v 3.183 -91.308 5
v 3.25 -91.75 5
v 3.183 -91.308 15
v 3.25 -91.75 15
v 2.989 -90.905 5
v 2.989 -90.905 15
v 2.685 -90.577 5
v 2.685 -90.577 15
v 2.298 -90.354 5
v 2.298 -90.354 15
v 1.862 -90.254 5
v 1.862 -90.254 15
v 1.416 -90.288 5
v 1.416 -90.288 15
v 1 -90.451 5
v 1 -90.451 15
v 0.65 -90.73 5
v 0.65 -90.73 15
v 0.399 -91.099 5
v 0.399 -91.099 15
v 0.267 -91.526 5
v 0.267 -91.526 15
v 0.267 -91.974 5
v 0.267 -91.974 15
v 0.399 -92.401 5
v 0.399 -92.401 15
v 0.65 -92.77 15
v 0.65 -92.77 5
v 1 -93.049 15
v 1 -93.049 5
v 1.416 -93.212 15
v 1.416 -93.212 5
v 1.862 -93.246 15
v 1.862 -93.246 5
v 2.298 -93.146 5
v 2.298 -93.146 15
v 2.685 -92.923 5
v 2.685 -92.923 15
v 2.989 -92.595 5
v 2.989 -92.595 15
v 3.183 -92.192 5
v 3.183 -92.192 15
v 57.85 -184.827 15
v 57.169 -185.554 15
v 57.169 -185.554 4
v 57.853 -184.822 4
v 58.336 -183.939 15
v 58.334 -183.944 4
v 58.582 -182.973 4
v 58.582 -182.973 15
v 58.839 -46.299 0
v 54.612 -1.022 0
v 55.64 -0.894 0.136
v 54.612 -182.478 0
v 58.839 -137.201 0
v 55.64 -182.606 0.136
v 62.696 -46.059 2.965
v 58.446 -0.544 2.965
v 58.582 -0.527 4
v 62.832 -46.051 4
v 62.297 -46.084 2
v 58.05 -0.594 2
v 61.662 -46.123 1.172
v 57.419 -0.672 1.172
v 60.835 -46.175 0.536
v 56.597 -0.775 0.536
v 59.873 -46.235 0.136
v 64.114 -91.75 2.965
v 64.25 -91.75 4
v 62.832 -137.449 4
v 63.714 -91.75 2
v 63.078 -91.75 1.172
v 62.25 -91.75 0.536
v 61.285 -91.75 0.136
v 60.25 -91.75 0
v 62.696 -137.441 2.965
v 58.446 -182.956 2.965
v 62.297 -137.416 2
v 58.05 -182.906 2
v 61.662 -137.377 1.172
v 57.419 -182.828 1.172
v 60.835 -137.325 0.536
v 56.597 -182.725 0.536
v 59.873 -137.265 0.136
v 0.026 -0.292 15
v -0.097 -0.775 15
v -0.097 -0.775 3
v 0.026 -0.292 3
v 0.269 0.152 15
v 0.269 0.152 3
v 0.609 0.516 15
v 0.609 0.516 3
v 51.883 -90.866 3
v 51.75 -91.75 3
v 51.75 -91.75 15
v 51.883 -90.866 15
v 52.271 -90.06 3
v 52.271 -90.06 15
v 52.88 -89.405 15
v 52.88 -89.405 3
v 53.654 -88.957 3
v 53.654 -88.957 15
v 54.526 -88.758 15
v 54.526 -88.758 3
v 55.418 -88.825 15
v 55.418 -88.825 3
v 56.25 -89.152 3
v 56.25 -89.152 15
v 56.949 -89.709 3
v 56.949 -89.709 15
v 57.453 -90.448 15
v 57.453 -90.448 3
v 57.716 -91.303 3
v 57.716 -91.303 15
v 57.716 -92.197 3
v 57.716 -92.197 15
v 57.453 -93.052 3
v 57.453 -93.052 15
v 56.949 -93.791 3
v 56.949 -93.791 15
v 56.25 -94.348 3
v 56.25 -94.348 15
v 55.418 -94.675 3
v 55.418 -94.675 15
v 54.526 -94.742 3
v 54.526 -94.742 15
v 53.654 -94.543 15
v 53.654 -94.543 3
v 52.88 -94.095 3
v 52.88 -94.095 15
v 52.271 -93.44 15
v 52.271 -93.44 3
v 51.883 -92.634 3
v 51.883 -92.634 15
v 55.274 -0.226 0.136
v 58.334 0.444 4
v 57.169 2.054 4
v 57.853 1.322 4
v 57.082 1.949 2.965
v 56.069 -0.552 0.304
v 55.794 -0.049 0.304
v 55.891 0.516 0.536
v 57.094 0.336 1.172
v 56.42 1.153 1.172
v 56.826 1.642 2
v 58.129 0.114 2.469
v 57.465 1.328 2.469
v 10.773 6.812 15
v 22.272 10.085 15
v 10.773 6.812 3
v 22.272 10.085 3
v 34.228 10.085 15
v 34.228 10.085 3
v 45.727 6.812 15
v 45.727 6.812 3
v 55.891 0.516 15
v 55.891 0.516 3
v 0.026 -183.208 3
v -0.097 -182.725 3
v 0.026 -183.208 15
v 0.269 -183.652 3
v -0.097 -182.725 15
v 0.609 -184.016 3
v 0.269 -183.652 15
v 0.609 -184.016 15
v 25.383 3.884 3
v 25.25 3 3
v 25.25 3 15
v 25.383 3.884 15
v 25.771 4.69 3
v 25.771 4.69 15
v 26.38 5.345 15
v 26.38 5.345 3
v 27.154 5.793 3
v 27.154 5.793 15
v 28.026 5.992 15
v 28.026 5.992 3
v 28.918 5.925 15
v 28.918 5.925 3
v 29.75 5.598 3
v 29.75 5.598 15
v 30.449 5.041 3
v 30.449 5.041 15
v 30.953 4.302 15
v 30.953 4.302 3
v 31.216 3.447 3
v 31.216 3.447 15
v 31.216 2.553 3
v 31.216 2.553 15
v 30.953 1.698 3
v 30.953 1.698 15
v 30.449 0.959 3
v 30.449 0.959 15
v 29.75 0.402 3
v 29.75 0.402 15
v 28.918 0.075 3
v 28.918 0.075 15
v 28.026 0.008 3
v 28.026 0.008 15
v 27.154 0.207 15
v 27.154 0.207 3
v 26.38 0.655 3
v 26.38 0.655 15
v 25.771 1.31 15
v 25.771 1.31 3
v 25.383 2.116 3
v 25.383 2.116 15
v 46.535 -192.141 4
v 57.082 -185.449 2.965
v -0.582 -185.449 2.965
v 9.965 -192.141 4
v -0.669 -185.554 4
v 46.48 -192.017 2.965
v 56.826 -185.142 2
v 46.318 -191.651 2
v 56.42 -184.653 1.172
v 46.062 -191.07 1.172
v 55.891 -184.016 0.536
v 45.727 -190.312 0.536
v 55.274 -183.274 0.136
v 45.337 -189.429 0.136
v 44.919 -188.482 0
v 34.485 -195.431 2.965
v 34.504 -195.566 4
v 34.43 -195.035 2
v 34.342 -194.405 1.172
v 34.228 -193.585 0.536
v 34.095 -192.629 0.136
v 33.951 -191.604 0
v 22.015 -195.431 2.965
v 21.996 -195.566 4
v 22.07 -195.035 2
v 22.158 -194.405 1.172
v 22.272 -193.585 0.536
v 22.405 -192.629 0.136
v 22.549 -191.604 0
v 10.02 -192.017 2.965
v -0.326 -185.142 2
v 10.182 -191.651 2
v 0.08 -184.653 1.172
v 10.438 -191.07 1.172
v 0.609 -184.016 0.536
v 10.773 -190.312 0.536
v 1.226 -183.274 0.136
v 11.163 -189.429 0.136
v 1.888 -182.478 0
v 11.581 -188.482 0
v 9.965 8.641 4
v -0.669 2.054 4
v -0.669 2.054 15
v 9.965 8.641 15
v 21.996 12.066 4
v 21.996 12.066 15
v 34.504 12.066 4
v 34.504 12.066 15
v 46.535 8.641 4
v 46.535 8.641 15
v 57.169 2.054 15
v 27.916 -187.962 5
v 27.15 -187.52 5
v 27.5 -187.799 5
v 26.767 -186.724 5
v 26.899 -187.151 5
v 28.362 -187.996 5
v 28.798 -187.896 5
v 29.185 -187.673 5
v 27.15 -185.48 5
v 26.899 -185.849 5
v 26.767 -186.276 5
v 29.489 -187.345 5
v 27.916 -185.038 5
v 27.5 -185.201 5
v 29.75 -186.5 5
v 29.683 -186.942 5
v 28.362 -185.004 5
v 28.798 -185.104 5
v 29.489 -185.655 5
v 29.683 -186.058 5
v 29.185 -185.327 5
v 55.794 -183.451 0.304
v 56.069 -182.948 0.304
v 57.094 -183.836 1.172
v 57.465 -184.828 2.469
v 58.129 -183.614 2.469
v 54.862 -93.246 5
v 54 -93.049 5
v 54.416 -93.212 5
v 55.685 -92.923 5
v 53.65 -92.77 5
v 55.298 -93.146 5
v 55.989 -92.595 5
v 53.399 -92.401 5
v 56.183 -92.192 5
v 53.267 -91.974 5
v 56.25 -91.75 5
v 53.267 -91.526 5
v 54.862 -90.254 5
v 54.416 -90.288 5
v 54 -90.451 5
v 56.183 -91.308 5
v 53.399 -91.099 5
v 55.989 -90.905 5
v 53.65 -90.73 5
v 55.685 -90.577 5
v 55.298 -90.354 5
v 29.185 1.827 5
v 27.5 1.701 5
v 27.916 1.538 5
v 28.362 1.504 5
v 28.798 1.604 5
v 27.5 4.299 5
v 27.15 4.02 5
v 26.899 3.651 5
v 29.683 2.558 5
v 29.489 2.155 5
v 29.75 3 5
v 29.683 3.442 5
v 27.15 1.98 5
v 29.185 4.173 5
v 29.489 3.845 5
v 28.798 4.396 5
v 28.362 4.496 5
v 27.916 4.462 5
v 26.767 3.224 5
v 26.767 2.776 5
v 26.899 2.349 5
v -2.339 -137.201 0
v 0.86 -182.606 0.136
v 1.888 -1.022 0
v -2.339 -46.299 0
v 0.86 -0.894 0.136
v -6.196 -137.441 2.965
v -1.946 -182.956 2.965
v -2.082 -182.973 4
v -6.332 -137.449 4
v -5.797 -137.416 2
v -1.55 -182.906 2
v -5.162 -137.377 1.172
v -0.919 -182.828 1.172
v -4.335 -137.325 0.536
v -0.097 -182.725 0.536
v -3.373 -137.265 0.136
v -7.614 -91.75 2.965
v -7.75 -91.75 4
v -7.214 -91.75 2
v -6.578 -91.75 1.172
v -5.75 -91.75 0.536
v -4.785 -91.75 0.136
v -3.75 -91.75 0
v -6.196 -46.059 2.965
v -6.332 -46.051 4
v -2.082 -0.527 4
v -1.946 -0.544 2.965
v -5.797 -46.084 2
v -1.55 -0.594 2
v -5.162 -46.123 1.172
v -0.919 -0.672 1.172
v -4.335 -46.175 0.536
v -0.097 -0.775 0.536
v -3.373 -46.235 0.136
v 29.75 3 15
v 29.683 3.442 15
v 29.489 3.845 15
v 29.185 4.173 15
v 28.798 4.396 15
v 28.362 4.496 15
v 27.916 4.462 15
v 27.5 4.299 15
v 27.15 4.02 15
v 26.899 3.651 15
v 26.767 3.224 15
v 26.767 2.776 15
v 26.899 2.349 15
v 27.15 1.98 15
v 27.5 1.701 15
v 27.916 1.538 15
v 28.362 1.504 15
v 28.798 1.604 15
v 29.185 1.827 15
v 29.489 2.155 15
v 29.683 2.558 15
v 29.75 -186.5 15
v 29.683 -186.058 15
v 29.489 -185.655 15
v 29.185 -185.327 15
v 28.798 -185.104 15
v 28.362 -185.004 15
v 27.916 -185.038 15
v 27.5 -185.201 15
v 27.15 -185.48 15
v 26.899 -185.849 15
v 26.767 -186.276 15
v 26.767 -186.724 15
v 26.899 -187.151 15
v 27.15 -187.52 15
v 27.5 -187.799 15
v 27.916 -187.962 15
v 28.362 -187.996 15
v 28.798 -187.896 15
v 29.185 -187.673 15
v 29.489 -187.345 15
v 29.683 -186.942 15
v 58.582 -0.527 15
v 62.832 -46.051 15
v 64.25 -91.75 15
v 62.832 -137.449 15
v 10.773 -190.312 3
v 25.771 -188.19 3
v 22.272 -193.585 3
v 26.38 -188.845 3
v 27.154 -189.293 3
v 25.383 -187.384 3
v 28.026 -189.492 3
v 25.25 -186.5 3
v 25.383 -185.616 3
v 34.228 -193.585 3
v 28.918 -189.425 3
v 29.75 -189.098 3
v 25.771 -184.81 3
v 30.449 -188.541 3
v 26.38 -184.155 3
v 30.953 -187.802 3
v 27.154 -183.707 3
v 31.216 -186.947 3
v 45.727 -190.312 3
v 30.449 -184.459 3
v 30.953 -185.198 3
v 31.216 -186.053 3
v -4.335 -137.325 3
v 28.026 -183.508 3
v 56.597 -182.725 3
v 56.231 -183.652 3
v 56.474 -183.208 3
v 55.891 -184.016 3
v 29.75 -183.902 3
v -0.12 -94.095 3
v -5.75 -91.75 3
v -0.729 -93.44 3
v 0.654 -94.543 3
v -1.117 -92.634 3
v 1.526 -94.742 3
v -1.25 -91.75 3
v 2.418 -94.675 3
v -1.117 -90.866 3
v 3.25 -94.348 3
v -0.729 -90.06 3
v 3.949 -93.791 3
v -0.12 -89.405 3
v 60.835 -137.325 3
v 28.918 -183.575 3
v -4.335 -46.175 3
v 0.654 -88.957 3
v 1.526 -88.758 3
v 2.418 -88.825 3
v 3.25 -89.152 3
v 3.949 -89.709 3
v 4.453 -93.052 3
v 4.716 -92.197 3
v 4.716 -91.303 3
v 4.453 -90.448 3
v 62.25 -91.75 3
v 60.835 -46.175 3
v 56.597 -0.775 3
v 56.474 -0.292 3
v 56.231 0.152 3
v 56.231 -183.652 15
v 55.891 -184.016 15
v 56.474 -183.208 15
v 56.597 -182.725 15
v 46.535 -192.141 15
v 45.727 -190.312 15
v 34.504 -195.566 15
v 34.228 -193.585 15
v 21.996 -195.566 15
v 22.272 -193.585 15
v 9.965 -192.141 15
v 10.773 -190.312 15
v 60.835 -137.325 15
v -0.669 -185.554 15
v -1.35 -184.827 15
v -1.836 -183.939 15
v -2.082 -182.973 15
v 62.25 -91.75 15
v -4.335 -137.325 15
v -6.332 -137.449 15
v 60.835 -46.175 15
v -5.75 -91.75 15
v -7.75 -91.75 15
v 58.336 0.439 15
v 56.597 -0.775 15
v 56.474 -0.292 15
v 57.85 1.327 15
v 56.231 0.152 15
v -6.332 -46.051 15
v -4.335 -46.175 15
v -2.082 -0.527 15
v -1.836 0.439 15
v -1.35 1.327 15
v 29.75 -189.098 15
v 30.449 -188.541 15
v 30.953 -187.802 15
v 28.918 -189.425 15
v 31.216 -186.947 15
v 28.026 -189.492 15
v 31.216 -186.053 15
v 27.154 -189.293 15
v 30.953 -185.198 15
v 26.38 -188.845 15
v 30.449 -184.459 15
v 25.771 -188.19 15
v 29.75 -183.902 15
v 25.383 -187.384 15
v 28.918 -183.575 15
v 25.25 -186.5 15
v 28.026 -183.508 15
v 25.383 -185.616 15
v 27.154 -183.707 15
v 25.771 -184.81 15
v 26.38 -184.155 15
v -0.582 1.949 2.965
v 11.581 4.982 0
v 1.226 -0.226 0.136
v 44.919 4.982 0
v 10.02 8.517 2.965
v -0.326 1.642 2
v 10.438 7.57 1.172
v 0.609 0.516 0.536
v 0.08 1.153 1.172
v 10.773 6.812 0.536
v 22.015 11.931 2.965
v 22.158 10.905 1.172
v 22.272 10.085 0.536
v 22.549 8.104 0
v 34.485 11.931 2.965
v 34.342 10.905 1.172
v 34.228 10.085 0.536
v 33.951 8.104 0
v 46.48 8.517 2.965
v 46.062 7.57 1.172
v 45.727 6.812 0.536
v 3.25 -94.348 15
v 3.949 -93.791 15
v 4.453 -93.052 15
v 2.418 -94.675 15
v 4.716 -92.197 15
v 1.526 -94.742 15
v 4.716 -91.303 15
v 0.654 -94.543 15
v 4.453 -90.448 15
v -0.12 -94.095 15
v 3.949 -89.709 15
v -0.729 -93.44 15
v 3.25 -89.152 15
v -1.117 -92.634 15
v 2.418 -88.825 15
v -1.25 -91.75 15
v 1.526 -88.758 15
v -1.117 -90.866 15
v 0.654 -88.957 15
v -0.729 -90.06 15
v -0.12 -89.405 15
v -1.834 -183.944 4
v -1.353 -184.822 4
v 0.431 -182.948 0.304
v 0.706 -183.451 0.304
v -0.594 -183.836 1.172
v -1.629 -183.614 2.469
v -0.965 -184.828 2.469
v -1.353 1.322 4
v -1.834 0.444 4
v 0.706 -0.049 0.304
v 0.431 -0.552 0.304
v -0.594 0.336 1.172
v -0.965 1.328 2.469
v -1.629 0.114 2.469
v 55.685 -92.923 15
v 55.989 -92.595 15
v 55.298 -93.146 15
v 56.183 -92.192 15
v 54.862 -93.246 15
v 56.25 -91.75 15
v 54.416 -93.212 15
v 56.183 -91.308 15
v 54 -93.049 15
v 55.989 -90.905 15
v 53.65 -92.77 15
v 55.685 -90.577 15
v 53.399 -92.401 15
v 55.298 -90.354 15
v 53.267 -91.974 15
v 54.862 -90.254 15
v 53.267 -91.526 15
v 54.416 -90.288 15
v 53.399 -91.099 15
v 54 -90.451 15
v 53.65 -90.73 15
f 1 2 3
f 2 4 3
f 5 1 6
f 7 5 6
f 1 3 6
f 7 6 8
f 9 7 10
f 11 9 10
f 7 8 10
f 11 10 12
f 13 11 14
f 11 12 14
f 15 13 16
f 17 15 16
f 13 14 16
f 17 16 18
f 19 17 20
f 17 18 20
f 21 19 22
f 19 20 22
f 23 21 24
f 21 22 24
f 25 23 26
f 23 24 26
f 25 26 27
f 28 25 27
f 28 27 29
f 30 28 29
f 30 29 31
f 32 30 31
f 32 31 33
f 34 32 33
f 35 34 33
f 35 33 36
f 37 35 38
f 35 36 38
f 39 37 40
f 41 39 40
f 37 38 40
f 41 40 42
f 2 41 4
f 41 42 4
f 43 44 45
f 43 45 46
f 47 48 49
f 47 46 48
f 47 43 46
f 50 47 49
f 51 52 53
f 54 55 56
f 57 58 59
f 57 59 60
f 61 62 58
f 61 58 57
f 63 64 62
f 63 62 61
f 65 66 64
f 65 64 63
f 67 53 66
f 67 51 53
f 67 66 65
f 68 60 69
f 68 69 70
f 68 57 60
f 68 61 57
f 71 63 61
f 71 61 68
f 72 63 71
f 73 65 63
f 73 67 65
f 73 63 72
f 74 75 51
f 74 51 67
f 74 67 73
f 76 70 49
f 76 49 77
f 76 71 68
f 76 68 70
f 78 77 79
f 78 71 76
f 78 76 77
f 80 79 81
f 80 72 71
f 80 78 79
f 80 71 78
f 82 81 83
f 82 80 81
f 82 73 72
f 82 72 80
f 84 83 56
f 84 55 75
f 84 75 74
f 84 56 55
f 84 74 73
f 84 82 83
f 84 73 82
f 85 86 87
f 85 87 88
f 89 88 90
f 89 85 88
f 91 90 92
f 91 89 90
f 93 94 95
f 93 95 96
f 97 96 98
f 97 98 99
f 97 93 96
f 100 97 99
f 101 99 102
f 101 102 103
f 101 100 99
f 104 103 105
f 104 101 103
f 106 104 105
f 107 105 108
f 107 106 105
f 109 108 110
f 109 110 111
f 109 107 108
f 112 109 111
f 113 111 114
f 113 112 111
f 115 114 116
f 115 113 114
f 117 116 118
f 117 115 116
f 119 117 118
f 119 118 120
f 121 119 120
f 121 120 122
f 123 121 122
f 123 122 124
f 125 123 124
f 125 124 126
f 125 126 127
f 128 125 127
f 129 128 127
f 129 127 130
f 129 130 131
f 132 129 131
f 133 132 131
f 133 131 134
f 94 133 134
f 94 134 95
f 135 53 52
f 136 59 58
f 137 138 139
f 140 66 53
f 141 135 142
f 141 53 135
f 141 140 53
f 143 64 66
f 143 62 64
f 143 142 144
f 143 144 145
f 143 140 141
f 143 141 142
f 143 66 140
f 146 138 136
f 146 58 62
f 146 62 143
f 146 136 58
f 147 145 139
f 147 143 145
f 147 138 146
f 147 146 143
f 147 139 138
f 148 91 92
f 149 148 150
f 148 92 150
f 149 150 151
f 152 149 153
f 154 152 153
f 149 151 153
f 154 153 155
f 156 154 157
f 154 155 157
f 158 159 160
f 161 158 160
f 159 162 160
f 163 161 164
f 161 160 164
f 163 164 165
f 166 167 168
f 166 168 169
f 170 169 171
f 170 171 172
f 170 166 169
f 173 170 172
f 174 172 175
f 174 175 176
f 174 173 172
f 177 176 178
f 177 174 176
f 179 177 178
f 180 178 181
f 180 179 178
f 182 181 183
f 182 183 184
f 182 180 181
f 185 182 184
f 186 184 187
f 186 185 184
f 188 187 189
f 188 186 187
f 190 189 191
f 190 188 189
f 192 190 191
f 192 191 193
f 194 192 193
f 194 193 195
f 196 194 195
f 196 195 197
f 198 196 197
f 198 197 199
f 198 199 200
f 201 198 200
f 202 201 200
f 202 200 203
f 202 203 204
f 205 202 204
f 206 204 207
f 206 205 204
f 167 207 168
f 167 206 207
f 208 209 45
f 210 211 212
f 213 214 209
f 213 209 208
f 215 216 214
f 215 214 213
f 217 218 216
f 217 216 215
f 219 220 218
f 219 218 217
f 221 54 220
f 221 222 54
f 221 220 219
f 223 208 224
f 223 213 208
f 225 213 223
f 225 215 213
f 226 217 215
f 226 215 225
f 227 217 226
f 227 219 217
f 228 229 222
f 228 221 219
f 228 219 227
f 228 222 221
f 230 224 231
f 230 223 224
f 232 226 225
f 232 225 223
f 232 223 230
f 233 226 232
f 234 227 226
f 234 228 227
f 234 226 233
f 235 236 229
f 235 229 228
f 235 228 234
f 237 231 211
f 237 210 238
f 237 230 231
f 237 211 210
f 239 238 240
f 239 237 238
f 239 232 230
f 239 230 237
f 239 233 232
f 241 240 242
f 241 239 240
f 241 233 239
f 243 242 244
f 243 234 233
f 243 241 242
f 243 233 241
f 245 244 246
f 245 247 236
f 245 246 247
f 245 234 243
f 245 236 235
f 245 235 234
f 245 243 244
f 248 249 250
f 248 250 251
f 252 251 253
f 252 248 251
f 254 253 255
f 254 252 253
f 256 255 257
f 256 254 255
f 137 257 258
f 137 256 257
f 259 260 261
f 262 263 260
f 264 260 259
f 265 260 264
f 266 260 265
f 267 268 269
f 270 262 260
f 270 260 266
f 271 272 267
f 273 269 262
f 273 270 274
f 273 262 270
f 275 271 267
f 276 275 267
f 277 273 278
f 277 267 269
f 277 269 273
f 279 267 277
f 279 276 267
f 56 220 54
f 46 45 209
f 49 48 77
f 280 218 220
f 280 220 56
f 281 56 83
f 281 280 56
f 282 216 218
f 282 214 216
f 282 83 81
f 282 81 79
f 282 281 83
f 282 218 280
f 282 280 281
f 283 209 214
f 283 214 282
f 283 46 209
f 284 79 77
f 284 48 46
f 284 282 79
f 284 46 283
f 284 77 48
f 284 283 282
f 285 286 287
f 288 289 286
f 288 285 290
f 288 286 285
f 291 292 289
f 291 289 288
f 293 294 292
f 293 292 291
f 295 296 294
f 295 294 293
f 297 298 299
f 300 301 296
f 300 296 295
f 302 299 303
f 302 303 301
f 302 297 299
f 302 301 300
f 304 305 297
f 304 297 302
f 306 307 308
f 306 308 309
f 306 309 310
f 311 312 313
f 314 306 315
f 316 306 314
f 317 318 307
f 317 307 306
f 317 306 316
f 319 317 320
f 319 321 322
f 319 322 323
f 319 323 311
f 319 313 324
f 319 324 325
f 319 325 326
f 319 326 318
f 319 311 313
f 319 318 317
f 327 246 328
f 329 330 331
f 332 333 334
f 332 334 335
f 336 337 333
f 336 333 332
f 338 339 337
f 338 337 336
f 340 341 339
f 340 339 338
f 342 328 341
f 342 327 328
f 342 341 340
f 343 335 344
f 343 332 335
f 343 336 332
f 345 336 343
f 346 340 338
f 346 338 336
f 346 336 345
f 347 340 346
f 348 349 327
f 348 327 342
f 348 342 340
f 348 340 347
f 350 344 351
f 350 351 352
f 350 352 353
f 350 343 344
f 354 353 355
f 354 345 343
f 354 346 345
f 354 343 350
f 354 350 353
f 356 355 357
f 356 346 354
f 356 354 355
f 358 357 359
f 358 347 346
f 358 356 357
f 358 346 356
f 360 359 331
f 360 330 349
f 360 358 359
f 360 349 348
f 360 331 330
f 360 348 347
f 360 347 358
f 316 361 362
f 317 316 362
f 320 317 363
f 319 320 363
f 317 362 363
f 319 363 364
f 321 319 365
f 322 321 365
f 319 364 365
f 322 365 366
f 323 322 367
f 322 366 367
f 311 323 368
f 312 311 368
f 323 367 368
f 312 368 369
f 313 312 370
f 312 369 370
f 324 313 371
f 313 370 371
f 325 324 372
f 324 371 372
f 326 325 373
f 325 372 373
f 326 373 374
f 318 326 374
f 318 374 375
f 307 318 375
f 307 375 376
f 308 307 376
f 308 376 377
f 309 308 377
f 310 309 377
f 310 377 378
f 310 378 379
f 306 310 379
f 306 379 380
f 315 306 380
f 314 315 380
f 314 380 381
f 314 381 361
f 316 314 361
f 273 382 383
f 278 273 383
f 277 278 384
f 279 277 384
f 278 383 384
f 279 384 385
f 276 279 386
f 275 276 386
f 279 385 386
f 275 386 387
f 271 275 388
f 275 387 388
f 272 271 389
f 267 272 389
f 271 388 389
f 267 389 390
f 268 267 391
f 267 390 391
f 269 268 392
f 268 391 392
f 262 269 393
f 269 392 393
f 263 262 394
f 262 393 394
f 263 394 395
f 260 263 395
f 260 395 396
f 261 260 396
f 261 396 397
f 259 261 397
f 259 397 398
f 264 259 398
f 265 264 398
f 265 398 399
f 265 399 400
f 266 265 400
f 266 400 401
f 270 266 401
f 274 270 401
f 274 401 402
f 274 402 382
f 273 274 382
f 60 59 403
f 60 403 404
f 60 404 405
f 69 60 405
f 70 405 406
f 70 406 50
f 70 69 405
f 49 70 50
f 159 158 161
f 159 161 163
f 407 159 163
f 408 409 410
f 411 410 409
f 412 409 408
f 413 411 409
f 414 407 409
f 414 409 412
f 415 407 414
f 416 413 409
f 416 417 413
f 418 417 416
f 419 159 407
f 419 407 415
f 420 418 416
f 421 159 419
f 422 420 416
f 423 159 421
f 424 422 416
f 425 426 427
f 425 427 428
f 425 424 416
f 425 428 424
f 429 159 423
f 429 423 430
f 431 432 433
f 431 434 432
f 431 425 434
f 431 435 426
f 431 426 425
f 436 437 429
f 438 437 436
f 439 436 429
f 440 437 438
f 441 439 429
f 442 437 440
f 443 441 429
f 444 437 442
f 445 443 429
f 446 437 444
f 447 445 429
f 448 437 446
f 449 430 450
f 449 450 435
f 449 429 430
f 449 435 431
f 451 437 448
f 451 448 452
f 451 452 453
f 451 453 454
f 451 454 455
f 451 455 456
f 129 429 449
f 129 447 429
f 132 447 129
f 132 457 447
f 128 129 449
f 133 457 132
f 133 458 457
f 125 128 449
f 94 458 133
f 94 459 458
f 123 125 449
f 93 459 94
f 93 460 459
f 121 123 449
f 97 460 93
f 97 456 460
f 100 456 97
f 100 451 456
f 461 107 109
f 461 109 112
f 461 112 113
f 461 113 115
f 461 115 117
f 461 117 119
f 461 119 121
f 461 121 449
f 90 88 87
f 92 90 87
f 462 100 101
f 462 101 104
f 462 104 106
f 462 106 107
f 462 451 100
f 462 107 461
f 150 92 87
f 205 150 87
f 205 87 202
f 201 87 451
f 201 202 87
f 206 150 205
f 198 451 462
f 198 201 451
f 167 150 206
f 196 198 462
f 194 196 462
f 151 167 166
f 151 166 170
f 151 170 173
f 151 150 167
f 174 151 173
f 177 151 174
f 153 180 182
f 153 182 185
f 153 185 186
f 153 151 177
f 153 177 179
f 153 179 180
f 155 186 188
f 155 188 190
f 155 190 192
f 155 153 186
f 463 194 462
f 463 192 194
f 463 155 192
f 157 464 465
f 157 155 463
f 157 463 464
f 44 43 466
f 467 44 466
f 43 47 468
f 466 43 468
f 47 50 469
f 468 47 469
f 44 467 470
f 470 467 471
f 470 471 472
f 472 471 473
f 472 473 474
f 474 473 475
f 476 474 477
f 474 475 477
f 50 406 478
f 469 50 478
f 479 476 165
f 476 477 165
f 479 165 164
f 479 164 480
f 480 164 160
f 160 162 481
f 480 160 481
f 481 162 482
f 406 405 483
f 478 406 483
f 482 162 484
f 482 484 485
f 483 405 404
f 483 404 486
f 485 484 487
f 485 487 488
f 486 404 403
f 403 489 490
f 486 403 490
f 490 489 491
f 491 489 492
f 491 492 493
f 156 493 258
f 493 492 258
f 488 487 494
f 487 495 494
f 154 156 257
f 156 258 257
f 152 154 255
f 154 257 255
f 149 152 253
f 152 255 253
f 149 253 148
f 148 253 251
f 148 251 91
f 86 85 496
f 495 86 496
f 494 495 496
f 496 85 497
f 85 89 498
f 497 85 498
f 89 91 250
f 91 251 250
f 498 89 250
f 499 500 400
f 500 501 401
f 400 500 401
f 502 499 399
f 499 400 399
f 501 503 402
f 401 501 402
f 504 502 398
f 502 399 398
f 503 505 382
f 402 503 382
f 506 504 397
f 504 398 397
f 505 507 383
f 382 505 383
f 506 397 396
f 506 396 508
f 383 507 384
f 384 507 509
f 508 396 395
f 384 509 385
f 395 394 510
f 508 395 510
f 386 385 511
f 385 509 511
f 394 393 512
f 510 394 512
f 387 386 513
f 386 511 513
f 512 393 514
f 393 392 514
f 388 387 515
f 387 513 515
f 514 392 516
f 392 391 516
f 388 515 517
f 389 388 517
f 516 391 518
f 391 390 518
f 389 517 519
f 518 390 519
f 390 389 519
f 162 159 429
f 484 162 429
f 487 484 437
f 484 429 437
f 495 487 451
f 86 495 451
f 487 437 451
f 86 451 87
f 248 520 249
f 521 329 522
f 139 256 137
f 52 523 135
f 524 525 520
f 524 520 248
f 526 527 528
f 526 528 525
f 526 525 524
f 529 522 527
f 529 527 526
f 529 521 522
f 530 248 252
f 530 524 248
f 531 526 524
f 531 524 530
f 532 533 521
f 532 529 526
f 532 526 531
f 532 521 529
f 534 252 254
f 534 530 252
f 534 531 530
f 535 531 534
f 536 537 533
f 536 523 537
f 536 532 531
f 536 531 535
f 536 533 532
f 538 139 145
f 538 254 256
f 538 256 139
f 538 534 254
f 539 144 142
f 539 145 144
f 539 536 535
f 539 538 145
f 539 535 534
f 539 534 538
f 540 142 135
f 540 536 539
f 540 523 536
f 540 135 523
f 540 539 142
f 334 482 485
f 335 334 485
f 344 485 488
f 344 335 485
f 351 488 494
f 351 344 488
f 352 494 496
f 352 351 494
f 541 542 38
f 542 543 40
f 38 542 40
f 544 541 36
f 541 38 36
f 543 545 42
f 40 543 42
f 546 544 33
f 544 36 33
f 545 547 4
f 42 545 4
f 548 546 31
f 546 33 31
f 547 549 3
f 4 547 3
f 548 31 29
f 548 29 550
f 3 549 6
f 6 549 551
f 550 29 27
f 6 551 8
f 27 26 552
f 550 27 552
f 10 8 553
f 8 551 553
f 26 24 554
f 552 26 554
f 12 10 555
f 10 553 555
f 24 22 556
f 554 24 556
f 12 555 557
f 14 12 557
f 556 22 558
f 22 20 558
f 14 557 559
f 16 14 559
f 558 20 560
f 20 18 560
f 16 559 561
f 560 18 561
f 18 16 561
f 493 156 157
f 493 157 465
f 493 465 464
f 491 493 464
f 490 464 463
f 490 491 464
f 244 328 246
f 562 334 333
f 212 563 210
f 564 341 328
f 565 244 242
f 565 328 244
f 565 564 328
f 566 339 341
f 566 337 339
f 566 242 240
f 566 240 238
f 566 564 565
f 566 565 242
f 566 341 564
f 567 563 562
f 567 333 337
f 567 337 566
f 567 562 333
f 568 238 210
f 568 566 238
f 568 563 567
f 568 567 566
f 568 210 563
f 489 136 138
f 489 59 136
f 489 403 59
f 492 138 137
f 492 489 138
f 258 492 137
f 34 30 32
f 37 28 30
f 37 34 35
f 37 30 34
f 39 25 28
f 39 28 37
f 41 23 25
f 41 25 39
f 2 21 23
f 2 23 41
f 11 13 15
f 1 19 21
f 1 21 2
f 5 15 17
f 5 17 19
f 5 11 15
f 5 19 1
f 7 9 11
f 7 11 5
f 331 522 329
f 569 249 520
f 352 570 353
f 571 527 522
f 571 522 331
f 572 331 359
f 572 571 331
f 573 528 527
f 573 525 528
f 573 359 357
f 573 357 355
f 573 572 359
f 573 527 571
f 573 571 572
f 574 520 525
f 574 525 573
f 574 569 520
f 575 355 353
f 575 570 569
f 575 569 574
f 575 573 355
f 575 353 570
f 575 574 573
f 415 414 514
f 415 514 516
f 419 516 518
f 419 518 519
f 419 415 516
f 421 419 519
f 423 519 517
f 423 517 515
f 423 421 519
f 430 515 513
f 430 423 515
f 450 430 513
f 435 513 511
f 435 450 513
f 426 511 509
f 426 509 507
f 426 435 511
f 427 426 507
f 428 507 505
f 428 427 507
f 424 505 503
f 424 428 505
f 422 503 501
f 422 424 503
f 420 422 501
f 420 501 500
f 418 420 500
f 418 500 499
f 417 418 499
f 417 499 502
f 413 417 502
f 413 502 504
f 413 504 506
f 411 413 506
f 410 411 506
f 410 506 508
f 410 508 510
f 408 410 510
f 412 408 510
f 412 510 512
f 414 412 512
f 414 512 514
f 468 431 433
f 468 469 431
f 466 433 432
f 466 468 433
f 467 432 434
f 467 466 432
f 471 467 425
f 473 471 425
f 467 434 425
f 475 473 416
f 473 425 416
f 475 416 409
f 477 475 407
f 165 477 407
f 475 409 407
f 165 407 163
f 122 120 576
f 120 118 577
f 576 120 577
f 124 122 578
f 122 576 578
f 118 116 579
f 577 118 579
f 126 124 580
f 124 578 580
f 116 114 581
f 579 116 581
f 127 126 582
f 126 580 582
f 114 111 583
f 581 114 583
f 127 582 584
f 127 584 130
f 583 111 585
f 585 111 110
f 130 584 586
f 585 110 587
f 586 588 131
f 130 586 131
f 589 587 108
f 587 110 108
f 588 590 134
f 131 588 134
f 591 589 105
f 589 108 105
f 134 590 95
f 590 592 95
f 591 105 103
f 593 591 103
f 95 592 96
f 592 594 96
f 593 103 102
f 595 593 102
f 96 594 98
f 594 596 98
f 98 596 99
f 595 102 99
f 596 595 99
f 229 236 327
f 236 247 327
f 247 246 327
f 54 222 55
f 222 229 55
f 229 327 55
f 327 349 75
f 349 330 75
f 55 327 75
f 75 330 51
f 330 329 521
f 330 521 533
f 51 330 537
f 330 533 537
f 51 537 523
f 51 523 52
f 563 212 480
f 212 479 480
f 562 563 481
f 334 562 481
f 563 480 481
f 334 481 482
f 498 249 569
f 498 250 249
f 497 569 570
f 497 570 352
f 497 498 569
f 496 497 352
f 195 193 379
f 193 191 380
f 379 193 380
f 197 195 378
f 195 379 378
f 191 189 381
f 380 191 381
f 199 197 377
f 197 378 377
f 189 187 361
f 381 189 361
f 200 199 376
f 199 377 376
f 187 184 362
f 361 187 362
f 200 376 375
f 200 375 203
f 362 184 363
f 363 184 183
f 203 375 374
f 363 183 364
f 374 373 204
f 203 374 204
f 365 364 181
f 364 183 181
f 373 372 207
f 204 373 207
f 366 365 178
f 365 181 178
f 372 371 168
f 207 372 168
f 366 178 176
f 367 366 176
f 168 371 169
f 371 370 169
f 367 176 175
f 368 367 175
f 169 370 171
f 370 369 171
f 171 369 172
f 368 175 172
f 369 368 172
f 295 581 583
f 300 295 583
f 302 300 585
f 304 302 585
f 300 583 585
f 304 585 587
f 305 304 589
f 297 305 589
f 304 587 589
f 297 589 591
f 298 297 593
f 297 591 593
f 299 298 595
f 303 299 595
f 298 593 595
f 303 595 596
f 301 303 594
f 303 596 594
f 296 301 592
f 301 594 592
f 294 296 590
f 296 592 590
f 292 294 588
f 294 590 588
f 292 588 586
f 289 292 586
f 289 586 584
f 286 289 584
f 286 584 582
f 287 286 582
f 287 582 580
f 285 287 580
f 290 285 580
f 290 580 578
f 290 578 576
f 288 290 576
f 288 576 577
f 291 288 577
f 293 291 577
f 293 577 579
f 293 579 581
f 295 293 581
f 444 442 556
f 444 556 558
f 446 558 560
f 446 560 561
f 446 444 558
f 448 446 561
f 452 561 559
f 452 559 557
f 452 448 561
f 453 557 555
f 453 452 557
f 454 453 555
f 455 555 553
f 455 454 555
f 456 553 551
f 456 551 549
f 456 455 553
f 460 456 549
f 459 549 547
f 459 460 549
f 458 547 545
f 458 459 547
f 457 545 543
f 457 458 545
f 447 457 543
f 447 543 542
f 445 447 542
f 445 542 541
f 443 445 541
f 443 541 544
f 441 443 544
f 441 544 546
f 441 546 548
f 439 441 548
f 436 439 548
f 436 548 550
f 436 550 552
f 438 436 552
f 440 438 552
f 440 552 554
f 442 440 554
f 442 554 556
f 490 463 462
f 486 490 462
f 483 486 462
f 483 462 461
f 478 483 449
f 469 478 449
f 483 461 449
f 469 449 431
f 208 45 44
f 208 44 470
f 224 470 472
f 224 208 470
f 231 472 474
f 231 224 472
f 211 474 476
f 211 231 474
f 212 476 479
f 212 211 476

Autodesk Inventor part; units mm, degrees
ref_plane "YZ Plane" through (0, 0, 0) normal (1, 0, 0) x (0, 1, 0)
ref_plane "XZ Plane" through (0, 0, 0) normal (0, 1, 0) x (-1, 0, 0)
ref_plane "XY Plane" through (0, 0, 0) normal (0, 0, 1) x (1, 0, 0)
sketch "Skizze1" plane through (0, 0, 0) normal (0, 0, 1) x (1, 0, 0)
  line L0 (0, 0) -> (56.5, 0) construction
  line L1 (56.5, 0) -> (56.5, -183.5) construction
  line L2 (0, 0) -> (56.5, 0) construction
  line L3 (56.5, 0) -> (56.5, -183.5) construction
  line L4 (56.5, -183.5) -> (0, -183.5) construction
  line L5 (0, -183.5) -> (0, 0) construction
  line L6 (28.25, 0) -> (28.25, 3) construction
  line L7 (28.25, -183.5) -> (28.25, -186.5) construction
  line L8 (28.25, -91.75) -> (1.75, -91.75) construction
  line L9 (28.25, -91.75) -> (-5.75, -91.75) construction
  line L10 (28.25, -91.75) -> (54.75, -91.75) construction
  line L11 (28.25, -91.75) -> (62.25, -91.75) construction
  circle A0 centre (28.25, 3) radius 1.5
  circle A1 centre (28.25, 3) radius 3
  line L12 (28.25, 3) -> (28.25, 10.5) construction
  circle A2 centre (28.25, -186.5) radius 1.5
  circle A3 centre (28.25, -186.5) radius 3
  line L13 (28.25, -186.5) -> (28.25, -194) construction
  circle A4 centre (1.75, -91.75) radius 1.5
  circle A5 centre (1.75, -91.75) radius 3
  circle A6 centre (54.75, -91.75) radius 1.5
  circle A7 centre (54.75, -91.75) radius 3
  line L14 (28.25, -183.5) -> (28.25, -153.093) construction
  line L15 (0, 0) -> (-5.75, -91.75) construction
  line L16 (-5.75, -91.75) -> (0, -183.5) construction
  line L17 (62.25, -91.75) -> (56.25, 0) construction
  arc A8 (0, 0) -> (0, -183.5) centre (729.1304, -91.75) ccw
  line L18 (60.0727, -126.4918) -> (62.25, -91.75) construction
  arc A9 (56.5, 0) -> (0, 0) centre (28.25, -32.753) ccw
  arc A10 (56.5, -183.5) -> (56.5, 0) centre (-672.6304, -91.75) ccw
  arc A11 (0, -183.5) -> (56.5, -183.5) centre (28.25, -150.747) ccw
extrude "Extrusion1" add sketch "Skizze1" along normal blind 3 contours A9 A10 A11 A8
sketch "Skizze2" plane through (0, 0, 0) normal (0, 0, -1) x (-1, 0, 0)
  circle A0 centre (-54.75, -91.75) radius 3 construction
  circle A1 centre (-1.75, -91.75) radius 3 construction
  circle A2 centre (-28.25, -186.5) radius 3 construction
  circle A3 centre (-28.25, 3) radius 3 construction
  arc A4 (0, -183.5) -> (0, 0) centre (-729.1304, -91.75) ccw projected
  arc A5 (0, 0) -> (-56.5, 0) centre (-28.25, -32.753) ccw projected
  arc A6 (-56.5, 0) -> (-56.5, -183.5) centre (672.6304, -91.75) ccw projected
  arc A7 (-56.5, -183.5) -> (0, -183.5) centre (-28.25, -150.747) ccw projected
  arc A8 (1.8892, -184.5029) -> (1.8892, 1.0029) centre (-729.1304, -91.75) ccw
  arc A9 (-58.3892, -184.5029) -> (1.8892, -184.5029) centre (-28.25, -150.747) ccw
  arc A10 (-58.3892, 1.0029) -> (-58.3892, -184.5029) centre (672.6304, -91.75) ccw
  arc A11 (1.8892, 1.0029) -> (-58.3892, 1.0029) centre (-28.25, -32.753) ccw
  dimension "d25" = 2
extrude "Extrusion2" add sketch "Skizze2" against normal blind 15
sketch "Skizze3" plane through (0, 0, 0) normal (0, 0, -1) x (-1, 0, 0)
  circle A0 centre (-28.25, 3) radius 3 projected
  circle A1 centre (-1.75, -91.75) radius 3 projected
  circle A2 centre (-54.75, -91.75) radius 3 projected
  circle A3 centre (-28.25, -186.5) radius 3 projected
  point P0 (0, 0)
extrude "Extrusion3" add sketch "Skizze3" against normal blind 15
sketch "Skizze4" plane through (28.25, 3, 15) normal (0, 0, 1) x (1, 0, 0)
  circle A0 centre (0, 0) radius 1.5
  circle A1 centre (-26.5, -94.75) radius 3 construction
  circle A2 centre (26.5, -94.75) radius 3 construction
  circle A3 centre (0, -189.5) radius 3 construction
  circle A4 centre (-26.5, -94.75) radius 1.5
  circle A5 centre (26.5, -94.75) radius 1.5
  circle A6 centre (0, -189.5) radius 1.5
  point P0 (-28.25, -3)
  dimension "d30" = 3
  dimension "d31" = 3
  dimension "d32" = 3
  dimension "d33" = 3
extrude "Extrusion4" cut sketch "Skizze4" against normal blind 10
fillet "Rundung1" radius 2 4 edges at (0, 0, 9) (56.5, 0, 9) (56.5, -183.5, 9) (0, -183.5, 9)
fillet "Rundung2" radius 4 8 edges at (64.25, -91.75, 0) (58.3892, 1.0029, 7.5) (28.25, 12.5, 0) (28.25, -196, 0) (-7.75, -91.75, 0) (-1.8892, 1.0029, 7.5) (58.3892, -184.5029, 7.5) (-1.8892, -184.5029, 7.5)
properties part number "armrest"
